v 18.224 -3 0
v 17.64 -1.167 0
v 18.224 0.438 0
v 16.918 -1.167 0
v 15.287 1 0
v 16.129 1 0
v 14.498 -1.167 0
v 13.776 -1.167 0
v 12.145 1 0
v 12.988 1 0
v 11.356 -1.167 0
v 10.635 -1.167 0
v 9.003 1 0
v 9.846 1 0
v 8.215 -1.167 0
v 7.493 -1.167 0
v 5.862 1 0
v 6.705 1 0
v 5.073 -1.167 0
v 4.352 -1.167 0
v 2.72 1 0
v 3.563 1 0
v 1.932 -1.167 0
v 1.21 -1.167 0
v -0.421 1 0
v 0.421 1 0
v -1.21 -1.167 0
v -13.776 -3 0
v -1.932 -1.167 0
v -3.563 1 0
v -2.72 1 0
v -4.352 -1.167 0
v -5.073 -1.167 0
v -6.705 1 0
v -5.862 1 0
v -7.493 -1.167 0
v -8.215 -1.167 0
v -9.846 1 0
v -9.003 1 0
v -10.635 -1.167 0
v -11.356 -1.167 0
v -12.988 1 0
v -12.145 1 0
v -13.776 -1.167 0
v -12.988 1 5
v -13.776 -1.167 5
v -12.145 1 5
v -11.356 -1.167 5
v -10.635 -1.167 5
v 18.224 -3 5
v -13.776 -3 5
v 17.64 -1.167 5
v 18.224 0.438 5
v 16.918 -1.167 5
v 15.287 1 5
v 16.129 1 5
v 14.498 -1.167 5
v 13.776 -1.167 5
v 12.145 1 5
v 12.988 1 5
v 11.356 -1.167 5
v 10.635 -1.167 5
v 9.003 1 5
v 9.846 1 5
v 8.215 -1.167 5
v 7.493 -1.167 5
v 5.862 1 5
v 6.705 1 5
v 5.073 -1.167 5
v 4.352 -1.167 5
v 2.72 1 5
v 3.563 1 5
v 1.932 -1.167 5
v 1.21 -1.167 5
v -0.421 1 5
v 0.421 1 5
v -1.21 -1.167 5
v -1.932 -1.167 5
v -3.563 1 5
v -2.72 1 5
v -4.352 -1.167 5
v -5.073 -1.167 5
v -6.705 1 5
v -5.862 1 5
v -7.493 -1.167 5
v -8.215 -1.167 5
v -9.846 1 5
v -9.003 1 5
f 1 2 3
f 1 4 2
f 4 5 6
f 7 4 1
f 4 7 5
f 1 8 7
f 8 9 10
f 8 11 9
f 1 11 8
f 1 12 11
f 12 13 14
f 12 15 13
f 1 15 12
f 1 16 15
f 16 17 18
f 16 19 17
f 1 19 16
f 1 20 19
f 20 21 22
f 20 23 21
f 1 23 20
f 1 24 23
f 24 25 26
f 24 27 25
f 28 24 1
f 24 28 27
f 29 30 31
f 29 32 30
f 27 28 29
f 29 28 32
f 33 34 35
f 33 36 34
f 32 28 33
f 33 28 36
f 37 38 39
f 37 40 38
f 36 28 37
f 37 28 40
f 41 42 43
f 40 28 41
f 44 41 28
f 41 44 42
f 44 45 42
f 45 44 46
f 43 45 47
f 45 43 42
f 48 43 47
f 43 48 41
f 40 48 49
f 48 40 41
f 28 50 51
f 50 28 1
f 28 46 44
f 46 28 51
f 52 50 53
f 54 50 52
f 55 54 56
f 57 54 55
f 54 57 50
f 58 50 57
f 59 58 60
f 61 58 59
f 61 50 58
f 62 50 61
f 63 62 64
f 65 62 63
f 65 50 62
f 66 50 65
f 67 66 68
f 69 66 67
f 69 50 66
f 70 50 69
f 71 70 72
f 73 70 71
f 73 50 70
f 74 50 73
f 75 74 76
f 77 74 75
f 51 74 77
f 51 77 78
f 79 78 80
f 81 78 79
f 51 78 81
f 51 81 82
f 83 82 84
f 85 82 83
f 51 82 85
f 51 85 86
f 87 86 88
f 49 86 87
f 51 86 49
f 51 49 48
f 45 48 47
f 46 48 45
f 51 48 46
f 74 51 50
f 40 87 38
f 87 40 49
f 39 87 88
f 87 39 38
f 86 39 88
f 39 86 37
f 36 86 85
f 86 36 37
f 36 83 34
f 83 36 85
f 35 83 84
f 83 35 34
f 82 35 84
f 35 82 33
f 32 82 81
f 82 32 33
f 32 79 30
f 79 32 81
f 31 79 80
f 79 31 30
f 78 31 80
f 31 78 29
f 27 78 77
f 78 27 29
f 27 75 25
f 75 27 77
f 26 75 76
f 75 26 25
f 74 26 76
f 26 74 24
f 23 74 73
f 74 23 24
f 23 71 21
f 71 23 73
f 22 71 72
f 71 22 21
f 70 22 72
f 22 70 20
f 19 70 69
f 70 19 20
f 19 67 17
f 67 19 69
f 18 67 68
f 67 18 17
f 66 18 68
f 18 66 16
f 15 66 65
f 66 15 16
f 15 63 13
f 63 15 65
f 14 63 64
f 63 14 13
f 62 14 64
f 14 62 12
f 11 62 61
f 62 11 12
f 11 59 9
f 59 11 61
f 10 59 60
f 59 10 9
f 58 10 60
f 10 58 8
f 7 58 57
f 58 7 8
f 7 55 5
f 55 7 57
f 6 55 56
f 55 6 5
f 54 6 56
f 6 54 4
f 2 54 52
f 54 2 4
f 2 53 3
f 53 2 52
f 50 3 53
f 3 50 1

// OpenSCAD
// Kopfspiel
spiel = 0.05;
// Höhe des Zahnkopfes über der Wälzgeraden
modul = 1;
// Laenge der Zahnstange
laenge = 32;
// Höhe der Zahnstange bis zur Wälzgeraden
hoehe = 3;
// Breite der Zähne
breite = 5;
// Eingriffswinkel, Standardwert = 20° gemäß DIN 867. Sollte nicht größer als 45° sein.
eingriffswinkel = 20;
// Schrägungswinkel zur Zahnstangen-Querachse; 0° = Geradverzahnung
schraegungswinkel = 0;

/* Bibliothek für Zahnstange für Thingiverse Customizer

Enthält die Module
zahnstange(modul, laenge, hoehe, breite, eingriffswinkel = 20, schraegungswinkel = 0)

Autor:		Dr Jörg Janssen
Stand:		6. Januar 2017
Version:	2.0
Lizenz:		Creative Commons - Attribution, Non Commercial, Share Alike

Erlaubte Module nach DIN 780:
0.05 0.06 0.08 0.10 0.12 0.16
0.20 0.25 0.3  0.4  0.5  0.6
0.7  0.8  0.9  1    1.25 1.5
2    2.5  3    4    5    6
8    10   12   16   20   25
32   40   50   60

*/


/* [Hidden] */
pi = 3.14159;
rad = 57.29578;
$fn = 96;

/*	Kopiert und dreht einen Körper */
module kopiere(vect, zahl, abstand, winkel){
	for(i = [0:zahl-1]){
		translate(v=vect*abstand*i)
			rotate(a=i*winkel, v = [0,0,1])
				children(0);
	}
}

/*  Zahnstange
    modul = Höhe des Zahnkopfes über der Wälzgeraden
    laenge = Laenge der Zahnstange
    hoehe = Höhe der Zahnstange bis zur Wälzgeraden
    breite = Breite der Zähne
    eingriffswinkel = Eingriffswinkel, Standardwert = 20° gemäß DIN 867. Sollte nicht größer als 45° sein.
    schraegungswinkel = Schrägungswinkel zur Zahnstangen-Querachse; 0° = Geradverzahnung */
module zahnstange(modul, laenge, hoehe, breite, eingriffswinkel = 20, schraegungswinkel = 0) {

	// Dimensions-Berechnungen
	c = modul / 6;												// Kopfspiel
	mx = modul/cos(schraegungswinkel);							// Durch Schrägungswinkel verzerrtes modul in x-Richtung
	a = 2*mx*tan(eingriffswinkel)+c*tan(eingriffswinkel);		// Flankenbreite
	b = pi*mx/2-2*mx*tan(eingriffswinkel);						// Kopfbreite
	x = breite*tan(schraegungswinkel);							// Verschiebung der Oberseite in x-Richtung durch Schrägungswinkel
	nz = ceil((laenge+abs(2*x))/(pi*mx));						// Anzahl der Zähne
	
	translate([-pi*mx*(floor(nz/2)-1)-a-b/2,-modul,0]){
		intersection(){
			kopiere([1,0,0], nz, pi*mx, 0){
				polyhedron(
					points=[[0,-c,0], [a,2*modul,0], [a+b,2*modul,0], [2*a+b,-c,0], [pi*mx,-c,0], [pi*mx,modul-hoehe,0], [0,modul-hoehe,0],	// Unterseite
						[0+x,-c,breite], [a+x,2*modul,breite], [a+b+x,2*modul,breite], [2*a+b+x,-c,breite], [pi*mx+x,-c,breite], [pi*mx+x,modul-hoehe,breite], [0+x,modul-hoehe,breite]],	// Oberseite
					faces=[[6,5,4,3,2,1,0],						// Unterseite
						[1,8,7,0],
						[9,8,1,2],
						[10,9,2,3],
						[11,10,3,4],
						[12,11,4,5],
						[13,12,5,6],
						[7,13,6,0],
						[7,8,9,10,11,12,13],					// Oberseite
					]
				);
			};
			translate([abs(x),-hoehe+modul-0.5,-0.5]){
				cube([laenge,hoehe+modul+1,breite+1]);
			}	
		};
	};	
}

zahnstange(modul, laenge, hoehe, breite, eingriffswinkel, schraegungswinkel);
